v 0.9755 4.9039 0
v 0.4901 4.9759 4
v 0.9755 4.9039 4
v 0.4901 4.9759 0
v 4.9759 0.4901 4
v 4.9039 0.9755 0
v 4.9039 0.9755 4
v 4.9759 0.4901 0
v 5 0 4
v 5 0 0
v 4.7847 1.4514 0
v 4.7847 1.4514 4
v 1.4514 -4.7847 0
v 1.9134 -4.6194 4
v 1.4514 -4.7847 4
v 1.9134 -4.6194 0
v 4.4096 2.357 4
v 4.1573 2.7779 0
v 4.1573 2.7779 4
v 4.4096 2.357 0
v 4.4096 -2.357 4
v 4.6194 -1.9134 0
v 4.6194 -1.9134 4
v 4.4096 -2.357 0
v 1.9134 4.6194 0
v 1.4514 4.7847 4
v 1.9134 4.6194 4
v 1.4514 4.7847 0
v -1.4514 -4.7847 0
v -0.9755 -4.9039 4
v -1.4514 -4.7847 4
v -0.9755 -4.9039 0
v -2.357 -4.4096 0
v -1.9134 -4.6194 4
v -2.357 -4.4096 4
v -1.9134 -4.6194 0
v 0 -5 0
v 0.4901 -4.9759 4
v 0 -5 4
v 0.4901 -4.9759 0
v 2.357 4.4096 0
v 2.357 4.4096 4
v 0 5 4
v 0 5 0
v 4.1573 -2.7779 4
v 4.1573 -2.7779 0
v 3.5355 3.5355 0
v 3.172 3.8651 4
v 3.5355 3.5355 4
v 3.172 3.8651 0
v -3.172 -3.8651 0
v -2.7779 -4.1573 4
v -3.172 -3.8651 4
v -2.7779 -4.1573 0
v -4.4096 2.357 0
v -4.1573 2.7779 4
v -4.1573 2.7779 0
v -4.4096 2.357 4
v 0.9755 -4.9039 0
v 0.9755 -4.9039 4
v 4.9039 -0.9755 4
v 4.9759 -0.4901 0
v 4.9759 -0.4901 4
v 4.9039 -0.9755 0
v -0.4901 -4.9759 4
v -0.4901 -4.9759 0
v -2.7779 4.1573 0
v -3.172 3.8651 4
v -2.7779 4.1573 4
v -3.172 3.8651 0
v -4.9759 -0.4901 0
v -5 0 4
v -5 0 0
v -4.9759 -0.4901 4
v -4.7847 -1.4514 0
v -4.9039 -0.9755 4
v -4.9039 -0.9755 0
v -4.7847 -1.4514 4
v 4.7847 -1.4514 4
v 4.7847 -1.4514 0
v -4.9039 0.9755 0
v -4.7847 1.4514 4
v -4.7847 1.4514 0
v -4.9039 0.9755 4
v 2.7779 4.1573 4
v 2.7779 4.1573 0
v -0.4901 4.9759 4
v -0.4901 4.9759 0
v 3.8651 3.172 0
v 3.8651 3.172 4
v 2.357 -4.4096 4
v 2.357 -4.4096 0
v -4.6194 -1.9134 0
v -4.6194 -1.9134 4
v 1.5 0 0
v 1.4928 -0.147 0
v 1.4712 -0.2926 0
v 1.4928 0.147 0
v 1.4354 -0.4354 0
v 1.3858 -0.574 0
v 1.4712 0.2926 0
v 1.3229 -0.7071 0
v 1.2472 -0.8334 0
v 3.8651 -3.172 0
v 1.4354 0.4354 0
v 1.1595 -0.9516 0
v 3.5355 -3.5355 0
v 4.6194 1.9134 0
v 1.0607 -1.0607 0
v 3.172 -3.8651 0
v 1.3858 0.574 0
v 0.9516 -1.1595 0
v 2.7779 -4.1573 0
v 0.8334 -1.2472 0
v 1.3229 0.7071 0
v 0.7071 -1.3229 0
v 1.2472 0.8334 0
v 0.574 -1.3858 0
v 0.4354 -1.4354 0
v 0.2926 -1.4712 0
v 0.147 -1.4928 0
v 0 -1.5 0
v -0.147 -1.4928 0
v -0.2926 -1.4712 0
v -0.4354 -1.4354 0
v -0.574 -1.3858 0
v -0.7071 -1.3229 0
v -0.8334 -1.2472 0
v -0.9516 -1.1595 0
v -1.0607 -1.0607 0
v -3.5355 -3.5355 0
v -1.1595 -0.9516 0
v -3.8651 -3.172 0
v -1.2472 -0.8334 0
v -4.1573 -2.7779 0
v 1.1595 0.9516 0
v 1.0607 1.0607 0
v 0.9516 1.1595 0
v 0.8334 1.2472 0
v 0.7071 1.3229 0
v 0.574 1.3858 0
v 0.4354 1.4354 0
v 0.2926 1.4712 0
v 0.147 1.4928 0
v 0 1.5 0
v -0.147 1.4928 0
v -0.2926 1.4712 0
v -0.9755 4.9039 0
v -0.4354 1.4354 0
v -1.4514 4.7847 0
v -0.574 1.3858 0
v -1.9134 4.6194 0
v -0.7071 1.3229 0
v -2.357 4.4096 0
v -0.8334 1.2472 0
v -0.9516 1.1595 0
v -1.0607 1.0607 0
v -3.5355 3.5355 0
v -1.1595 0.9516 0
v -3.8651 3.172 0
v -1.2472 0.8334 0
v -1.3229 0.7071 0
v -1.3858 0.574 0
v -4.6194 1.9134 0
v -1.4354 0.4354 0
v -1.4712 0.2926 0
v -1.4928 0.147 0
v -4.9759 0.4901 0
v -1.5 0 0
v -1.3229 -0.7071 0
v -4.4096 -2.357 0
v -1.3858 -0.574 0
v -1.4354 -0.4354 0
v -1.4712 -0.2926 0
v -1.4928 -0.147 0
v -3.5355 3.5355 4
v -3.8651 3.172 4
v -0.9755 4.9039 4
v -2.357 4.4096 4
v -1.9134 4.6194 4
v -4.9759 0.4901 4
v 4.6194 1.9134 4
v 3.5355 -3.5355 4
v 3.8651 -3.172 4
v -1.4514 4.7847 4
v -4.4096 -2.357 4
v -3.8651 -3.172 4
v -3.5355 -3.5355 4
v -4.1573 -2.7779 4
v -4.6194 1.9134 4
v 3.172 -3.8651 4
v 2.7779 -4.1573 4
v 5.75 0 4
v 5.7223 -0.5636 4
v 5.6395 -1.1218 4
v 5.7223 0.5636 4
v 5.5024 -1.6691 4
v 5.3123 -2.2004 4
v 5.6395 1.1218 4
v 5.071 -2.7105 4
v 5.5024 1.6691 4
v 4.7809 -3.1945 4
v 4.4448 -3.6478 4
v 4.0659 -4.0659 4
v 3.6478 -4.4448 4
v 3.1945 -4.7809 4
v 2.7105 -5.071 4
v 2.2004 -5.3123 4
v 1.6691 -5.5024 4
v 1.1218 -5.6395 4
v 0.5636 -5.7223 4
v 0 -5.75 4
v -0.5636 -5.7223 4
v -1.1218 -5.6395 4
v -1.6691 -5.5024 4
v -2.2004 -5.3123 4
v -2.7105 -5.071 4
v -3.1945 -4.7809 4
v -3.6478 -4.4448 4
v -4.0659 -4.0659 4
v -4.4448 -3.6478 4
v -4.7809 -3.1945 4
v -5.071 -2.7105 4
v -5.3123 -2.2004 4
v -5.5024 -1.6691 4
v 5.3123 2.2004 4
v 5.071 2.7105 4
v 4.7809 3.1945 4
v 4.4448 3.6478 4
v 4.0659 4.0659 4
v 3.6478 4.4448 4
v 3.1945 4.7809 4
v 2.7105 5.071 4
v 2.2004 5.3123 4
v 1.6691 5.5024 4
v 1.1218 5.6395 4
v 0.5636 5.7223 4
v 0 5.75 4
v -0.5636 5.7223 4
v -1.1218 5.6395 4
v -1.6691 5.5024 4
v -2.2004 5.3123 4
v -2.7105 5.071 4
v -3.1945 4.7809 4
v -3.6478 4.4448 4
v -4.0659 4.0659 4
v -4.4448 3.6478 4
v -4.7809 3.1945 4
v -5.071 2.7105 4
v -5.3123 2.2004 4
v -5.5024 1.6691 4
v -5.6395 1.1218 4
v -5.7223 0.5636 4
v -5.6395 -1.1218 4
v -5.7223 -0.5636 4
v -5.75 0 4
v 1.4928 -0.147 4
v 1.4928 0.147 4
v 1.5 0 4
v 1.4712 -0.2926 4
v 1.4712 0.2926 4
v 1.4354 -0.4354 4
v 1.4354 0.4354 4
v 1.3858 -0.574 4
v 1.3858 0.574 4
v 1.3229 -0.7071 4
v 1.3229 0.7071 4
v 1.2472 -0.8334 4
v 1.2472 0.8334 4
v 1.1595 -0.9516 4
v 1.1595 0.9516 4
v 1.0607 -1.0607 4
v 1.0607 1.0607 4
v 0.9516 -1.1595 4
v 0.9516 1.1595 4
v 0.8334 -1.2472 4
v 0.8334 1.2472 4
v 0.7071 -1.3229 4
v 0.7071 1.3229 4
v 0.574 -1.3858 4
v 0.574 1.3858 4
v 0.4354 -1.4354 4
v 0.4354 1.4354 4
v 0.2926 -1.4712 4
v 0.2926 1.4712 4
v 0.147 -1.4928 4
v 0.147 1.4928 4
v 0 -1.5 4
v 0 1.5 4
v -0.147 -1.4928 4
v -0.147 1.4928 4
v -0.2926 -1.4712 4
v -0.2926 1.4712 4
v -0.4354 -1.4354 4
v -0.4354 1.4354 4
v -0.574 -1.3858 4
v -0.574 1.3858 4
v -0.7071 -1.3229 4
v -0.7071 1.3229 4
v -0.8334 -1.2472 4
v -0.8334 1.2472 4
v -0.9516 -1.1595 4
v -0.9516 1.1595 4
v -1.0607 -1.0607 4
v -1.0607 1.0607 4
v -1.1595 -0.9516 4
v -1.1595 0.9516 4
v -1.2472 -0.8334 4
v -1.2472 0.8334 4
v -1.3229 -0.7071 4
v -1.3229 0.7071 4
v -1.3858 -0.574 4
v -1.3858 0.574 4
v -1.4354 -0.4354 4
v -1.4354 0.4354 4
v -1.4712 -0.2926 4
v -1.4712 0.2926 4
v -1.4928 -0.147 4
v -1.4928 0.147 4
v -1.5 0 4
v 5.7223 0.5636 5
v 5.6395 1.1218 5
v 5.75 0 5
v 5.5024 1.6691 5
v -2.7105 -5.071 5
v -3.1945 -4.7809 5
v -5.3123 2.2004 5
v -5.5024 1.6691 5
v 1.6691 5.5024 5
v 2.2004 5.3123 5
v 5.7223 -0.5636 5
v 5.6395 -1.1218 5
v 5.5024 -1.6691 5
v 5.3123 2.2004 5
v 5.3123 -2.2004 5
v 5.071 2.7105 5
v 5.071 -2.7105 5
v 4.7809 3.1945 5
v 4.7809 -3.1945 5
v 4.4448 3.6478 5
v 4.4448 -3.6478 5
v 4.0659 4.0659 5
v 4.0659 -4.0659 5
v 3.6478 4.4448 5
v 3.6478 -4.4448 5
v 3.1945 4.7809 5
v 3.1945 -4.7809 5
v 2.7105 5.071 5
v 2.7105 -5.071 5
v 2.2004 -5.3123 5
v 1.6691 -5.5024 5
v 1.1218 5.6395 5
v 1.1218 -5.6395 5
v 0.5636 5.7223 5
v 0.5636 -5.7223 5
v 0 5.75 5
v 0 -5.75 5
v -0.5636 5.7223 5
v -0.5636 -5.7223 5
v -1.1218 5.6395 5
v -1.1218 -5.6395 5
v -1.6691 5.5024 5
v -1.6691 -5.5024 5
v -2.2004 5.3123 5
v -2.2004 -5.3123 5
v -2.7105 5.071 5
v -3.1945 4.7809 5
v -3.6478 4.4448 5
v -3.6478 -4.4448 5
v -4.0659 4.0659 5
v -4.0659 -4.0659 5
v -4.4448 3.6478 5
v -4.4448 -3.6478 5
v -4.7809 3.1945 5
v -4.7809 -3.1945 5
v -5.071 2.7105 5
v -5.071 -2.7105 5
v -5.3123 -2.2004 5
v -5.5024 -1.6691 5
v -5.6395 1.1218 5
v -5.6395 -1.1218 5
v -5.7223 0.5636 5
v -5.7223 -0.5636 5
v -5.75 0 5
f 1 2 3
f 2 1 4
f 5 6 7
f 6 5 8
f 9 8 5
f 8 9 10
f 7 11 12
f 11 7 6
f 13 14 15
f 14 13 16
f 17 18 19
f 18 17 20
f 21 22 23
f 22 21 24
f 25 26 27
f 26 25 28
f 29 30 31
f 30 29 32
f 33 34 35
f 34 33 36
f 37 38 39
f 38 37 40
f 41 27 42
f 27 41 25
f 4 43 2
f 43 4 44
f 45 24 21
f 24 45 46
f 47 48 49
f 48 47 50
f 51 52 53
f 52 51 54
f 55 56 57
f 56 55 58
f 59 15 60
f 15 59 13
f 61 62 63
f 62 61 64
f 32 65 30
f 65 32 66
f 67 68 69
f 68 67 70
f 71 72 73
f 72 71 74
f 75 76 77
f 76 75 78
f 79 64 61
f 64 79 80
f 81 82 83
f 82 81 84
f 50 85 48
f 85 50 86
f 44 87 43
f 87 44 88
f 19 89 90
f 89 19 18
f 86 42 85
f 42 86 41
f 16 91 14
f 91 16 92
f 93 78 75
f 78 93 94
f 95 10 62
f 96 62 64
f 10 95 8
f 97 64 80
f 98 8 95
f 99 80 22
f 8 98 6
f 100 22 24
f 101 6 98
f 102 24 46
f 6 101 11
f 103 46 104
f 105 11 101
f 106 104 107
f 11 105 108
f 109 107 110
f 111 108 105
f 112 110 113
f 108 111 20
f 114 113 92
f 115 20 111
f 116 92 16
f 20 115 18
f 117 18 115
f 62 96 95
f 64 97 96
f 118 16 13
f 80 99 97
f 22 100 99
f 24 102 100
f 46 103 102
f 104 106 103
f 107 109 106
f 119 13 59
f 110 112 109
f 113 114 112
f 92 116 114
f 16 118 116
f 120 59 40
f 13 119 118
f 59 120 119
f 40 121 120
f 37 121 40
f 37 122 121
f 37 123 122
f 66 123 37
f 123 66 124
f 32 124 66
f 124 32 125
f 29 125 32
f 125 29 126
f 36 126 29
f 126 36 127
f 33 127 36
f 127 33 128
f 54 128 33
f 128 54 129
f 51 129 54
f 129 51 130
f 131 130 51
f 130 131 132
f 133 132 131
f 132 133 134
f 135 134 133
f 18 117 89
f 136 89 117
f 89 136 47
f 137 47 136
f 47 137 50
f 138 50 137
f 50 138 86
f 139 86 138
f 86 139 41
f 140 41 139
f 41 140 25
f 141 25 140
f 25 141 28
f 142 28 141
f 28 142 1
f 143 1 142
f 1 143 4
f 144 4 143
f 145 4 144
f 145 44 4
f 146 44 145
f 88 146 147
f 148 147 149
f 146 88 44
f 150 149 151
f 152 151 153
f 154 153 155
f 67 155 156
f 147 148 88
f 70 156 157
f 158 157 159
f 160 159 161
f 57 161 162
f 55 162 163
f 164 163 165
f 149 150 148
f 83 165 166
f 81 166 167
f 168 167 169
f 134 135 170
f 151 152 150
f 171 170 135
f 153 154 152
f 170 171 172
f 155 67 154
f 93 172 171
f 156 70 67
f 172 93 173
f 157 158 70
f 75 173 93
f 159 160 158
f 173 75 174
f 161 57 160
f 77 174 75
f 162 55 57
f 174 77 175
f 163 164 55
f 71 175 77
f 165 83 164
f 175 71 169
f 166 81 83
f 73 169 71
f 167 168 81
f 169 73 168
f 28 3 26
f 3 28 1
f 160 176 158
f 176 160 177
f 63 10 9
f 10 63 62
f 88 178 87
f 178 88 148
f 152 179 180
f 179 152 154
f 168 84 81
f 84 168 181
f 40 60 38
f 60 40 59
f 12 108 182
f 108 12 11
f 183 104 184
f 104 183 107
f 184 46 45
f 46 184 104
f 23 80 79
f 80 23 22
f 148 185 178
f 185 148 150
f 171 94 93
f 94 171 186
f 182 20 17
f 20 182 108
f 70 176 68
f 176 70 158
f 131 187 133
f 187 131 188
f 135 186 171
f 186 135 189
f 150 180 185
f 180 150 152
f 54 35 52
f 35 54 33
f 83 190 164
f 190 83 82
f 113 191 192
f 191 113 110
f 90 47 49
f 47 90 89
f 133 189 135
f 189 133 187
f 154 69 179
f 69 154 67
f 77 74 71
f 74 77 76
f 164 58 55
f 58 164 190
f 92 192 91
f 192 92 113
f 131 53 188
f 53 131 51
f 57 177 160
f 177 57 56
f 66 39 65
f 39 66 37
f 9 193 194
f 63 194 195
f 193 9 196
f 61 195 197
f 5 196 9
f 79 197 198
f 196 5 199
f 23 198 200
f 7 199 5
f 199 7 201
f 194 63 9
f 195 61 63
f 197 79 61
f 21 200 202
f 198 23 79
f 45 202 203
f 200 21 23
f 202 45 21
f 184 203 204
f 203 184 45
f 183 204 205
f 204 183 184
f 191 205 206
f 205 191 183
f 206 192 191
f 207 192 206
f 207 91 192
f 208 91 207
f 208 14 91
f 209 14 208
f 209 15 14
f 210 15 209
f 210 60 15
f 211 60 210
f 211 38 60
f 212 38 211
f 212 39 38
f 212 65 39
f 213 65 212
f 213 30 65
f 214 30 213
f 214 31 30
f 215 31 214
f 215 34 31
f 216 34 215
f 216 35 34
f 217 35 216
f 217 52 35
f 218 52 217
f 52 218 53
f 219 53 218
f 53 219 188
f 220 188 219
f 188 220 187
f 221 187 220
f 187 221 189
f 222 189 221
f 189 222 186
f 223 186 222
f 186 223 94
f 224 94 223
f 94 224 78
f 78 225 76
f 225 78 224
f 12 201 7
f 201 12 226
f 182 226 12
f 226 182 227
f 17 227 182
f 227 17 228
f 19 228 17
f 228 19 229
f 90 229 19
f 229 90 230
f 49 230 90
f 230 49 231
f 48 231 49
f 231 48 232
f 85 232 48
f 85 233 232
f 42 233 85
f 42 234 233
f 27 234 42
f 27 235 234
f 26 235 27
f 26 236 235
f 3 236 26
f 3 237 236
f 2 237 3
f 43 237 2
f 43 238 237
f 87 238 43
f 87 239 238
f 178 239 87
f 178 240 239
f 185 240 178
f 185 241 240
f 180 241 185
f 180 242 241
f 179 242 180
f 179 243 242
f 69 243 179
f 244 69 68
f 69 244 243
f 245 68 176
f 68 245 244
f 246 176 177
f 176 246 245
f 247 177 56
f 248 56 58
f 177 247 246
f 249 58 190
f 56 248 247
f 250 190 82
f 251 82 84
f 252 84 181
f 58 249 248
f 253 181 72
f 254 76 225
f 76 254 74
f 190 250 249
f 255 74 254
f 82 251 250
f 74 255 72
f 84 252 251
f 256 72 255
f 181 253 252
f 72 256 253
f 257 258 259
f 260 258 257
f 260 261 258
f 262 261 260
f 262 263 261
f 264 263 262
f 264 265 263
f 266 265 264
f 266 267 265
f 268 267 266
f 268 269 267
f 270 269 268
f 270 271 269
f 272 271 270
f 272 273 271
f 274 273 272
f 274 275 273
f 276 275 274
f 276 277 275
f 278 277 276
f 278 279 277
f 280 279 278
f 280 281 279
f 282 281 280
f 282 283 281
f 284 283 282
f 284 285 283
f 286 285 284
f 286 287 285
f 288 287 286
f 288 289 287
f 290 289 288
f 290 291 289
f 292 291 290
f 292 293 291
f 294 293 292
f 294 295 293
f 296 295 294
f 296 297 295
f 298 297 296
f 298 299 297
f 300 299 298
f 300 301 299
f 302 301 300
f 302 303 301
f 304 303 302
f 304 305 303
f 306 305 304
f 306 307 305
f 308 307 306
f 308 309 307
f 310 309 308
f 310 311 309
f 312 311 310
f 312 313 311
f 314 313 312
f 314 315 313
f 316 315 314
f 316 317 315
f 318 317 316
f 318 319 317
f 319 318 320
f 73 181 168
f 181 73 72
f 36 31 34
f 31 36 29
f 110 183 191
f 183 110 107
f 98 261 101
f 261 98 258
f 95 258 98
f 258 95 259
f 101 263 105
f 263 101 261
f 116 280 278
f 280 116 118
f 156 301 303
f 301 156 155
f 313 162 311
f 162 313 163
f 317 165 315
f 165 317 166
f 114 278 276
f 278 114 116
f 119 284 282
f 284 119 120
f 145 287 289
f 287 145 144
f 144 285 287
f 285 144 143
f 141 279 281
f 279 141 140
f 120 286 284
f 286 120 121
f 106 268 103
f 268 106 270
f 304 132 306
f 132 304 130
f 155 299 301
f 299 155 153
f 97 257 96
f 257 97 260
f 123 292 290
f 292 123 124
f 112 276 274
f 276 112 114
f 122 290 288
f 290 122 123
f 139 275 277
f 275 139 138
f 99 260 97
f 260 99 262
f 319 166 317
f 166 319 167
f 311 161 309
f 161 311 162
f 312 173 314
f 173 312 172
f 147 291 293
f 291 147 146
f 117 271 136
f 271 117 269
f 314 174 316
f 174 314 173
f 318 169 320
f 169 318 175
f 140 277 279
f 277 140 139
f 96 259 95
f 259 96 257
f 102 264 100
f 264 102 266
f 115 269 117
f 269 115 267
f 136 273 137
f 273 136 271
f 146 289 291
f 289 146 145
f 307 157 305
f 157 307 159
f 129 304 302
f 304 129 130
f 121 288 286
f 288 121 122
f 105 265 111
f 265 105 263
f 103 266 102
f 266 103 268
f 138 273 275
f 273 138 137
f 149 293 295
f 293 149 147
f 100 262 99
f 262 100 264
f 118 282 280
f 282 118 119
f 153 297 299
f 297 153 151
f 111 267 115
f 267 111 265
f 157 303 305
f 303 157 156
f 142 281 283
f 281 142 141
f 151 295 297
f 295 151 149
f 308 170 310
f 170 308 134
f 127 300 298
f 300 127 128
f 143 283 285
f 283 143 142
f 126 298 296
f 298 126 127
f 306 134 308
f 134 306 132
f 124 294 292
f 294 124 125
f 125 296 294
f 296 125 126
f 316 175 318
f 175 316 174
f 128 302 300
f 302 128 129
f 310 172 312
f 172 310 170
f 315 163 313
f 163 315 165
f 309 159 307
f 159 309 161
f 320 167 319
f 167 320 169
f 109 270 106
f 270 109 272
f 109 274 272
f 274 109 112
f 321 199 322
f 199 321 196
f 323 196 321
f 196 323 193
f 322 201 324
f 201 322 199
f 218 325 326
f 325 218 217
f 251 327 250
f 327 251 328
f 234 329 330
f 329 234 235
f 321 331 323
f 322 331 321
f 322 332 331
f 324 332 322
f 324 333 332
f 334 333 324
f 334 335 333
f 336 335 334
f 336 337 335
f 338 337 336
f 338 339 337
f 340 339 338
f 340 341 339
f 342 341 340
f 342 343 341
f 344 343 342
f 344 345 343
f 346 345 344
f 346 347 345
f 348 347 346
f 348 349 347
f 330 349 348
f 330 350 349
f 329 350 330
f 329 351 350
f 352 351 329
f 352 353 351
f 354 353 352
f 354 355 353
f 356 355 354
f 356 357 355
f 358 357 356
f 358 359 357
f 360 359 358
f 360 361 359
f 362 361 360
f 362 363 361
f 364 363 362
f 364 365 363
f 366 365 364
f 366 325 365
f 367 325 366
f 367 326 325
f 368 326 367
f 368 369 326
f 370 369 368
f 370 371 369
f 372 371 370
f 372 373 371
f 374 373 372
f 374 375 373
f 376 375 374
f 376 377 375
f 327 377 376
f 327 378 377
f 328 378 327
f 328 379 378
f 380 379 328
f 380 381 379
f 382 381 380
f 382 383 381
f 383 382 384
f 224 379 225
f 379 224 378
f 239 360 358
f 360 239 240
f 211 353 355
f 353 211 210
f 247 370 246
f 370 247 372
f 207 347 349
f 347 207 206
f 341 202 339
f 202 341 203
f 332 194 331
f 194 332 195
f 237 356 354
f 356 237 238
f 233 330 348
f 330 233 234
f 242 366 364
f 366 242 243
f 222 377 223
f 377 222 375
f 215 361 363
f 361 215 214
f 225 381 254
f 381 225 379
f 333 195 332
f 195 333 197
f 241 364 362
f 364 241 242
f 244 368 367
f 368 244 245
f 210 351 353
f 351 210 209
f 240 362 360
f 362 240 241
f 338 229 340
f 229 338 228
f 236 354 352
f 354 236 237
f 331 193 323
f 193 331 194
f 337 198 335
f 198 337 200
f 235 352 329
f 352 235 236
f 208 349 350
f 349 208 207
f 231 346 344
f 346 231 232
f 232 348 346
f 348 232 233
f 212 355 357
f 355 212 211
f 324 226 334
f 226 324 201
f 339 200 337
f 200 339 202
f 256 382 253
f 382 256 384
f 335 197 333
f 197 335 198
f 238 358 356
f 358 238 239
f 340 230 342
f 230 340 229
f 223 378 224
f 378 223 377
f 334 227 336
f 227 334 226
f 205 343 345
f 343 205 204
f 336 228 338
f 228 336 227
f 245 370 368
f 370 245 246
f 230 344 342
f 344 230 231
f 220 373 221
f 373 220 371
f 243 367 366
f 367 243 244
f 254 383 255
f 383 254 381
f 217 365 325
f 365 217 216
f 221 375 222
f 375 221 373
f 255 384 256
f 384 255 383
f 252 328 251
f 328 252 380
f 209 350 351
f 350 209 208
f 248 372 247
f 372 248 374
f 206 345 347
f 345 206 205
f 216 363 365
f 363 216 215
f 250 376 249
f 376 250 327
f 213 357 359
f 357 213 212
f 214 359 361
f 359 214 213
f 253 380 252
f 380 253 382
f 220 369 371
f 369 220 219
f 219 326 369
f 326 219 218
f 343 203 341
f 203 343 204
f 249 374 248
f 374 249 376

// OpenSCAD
module flanged_ball_bearing() {
    difference() {
        // Outer cylinder
        cylinder(d=10.0, h=4.0, $fn=64);
        
        // Inner bore
        translate([0, 0, -1])
            cylinder(d=3.0, h=6.0, $fn=64);
    }
    
    // Flange
    translate([0, 0, 4.0])
        cylinder(d=11.5, h=1.0, $fn=64);
}

flanged_ball_bearing();
